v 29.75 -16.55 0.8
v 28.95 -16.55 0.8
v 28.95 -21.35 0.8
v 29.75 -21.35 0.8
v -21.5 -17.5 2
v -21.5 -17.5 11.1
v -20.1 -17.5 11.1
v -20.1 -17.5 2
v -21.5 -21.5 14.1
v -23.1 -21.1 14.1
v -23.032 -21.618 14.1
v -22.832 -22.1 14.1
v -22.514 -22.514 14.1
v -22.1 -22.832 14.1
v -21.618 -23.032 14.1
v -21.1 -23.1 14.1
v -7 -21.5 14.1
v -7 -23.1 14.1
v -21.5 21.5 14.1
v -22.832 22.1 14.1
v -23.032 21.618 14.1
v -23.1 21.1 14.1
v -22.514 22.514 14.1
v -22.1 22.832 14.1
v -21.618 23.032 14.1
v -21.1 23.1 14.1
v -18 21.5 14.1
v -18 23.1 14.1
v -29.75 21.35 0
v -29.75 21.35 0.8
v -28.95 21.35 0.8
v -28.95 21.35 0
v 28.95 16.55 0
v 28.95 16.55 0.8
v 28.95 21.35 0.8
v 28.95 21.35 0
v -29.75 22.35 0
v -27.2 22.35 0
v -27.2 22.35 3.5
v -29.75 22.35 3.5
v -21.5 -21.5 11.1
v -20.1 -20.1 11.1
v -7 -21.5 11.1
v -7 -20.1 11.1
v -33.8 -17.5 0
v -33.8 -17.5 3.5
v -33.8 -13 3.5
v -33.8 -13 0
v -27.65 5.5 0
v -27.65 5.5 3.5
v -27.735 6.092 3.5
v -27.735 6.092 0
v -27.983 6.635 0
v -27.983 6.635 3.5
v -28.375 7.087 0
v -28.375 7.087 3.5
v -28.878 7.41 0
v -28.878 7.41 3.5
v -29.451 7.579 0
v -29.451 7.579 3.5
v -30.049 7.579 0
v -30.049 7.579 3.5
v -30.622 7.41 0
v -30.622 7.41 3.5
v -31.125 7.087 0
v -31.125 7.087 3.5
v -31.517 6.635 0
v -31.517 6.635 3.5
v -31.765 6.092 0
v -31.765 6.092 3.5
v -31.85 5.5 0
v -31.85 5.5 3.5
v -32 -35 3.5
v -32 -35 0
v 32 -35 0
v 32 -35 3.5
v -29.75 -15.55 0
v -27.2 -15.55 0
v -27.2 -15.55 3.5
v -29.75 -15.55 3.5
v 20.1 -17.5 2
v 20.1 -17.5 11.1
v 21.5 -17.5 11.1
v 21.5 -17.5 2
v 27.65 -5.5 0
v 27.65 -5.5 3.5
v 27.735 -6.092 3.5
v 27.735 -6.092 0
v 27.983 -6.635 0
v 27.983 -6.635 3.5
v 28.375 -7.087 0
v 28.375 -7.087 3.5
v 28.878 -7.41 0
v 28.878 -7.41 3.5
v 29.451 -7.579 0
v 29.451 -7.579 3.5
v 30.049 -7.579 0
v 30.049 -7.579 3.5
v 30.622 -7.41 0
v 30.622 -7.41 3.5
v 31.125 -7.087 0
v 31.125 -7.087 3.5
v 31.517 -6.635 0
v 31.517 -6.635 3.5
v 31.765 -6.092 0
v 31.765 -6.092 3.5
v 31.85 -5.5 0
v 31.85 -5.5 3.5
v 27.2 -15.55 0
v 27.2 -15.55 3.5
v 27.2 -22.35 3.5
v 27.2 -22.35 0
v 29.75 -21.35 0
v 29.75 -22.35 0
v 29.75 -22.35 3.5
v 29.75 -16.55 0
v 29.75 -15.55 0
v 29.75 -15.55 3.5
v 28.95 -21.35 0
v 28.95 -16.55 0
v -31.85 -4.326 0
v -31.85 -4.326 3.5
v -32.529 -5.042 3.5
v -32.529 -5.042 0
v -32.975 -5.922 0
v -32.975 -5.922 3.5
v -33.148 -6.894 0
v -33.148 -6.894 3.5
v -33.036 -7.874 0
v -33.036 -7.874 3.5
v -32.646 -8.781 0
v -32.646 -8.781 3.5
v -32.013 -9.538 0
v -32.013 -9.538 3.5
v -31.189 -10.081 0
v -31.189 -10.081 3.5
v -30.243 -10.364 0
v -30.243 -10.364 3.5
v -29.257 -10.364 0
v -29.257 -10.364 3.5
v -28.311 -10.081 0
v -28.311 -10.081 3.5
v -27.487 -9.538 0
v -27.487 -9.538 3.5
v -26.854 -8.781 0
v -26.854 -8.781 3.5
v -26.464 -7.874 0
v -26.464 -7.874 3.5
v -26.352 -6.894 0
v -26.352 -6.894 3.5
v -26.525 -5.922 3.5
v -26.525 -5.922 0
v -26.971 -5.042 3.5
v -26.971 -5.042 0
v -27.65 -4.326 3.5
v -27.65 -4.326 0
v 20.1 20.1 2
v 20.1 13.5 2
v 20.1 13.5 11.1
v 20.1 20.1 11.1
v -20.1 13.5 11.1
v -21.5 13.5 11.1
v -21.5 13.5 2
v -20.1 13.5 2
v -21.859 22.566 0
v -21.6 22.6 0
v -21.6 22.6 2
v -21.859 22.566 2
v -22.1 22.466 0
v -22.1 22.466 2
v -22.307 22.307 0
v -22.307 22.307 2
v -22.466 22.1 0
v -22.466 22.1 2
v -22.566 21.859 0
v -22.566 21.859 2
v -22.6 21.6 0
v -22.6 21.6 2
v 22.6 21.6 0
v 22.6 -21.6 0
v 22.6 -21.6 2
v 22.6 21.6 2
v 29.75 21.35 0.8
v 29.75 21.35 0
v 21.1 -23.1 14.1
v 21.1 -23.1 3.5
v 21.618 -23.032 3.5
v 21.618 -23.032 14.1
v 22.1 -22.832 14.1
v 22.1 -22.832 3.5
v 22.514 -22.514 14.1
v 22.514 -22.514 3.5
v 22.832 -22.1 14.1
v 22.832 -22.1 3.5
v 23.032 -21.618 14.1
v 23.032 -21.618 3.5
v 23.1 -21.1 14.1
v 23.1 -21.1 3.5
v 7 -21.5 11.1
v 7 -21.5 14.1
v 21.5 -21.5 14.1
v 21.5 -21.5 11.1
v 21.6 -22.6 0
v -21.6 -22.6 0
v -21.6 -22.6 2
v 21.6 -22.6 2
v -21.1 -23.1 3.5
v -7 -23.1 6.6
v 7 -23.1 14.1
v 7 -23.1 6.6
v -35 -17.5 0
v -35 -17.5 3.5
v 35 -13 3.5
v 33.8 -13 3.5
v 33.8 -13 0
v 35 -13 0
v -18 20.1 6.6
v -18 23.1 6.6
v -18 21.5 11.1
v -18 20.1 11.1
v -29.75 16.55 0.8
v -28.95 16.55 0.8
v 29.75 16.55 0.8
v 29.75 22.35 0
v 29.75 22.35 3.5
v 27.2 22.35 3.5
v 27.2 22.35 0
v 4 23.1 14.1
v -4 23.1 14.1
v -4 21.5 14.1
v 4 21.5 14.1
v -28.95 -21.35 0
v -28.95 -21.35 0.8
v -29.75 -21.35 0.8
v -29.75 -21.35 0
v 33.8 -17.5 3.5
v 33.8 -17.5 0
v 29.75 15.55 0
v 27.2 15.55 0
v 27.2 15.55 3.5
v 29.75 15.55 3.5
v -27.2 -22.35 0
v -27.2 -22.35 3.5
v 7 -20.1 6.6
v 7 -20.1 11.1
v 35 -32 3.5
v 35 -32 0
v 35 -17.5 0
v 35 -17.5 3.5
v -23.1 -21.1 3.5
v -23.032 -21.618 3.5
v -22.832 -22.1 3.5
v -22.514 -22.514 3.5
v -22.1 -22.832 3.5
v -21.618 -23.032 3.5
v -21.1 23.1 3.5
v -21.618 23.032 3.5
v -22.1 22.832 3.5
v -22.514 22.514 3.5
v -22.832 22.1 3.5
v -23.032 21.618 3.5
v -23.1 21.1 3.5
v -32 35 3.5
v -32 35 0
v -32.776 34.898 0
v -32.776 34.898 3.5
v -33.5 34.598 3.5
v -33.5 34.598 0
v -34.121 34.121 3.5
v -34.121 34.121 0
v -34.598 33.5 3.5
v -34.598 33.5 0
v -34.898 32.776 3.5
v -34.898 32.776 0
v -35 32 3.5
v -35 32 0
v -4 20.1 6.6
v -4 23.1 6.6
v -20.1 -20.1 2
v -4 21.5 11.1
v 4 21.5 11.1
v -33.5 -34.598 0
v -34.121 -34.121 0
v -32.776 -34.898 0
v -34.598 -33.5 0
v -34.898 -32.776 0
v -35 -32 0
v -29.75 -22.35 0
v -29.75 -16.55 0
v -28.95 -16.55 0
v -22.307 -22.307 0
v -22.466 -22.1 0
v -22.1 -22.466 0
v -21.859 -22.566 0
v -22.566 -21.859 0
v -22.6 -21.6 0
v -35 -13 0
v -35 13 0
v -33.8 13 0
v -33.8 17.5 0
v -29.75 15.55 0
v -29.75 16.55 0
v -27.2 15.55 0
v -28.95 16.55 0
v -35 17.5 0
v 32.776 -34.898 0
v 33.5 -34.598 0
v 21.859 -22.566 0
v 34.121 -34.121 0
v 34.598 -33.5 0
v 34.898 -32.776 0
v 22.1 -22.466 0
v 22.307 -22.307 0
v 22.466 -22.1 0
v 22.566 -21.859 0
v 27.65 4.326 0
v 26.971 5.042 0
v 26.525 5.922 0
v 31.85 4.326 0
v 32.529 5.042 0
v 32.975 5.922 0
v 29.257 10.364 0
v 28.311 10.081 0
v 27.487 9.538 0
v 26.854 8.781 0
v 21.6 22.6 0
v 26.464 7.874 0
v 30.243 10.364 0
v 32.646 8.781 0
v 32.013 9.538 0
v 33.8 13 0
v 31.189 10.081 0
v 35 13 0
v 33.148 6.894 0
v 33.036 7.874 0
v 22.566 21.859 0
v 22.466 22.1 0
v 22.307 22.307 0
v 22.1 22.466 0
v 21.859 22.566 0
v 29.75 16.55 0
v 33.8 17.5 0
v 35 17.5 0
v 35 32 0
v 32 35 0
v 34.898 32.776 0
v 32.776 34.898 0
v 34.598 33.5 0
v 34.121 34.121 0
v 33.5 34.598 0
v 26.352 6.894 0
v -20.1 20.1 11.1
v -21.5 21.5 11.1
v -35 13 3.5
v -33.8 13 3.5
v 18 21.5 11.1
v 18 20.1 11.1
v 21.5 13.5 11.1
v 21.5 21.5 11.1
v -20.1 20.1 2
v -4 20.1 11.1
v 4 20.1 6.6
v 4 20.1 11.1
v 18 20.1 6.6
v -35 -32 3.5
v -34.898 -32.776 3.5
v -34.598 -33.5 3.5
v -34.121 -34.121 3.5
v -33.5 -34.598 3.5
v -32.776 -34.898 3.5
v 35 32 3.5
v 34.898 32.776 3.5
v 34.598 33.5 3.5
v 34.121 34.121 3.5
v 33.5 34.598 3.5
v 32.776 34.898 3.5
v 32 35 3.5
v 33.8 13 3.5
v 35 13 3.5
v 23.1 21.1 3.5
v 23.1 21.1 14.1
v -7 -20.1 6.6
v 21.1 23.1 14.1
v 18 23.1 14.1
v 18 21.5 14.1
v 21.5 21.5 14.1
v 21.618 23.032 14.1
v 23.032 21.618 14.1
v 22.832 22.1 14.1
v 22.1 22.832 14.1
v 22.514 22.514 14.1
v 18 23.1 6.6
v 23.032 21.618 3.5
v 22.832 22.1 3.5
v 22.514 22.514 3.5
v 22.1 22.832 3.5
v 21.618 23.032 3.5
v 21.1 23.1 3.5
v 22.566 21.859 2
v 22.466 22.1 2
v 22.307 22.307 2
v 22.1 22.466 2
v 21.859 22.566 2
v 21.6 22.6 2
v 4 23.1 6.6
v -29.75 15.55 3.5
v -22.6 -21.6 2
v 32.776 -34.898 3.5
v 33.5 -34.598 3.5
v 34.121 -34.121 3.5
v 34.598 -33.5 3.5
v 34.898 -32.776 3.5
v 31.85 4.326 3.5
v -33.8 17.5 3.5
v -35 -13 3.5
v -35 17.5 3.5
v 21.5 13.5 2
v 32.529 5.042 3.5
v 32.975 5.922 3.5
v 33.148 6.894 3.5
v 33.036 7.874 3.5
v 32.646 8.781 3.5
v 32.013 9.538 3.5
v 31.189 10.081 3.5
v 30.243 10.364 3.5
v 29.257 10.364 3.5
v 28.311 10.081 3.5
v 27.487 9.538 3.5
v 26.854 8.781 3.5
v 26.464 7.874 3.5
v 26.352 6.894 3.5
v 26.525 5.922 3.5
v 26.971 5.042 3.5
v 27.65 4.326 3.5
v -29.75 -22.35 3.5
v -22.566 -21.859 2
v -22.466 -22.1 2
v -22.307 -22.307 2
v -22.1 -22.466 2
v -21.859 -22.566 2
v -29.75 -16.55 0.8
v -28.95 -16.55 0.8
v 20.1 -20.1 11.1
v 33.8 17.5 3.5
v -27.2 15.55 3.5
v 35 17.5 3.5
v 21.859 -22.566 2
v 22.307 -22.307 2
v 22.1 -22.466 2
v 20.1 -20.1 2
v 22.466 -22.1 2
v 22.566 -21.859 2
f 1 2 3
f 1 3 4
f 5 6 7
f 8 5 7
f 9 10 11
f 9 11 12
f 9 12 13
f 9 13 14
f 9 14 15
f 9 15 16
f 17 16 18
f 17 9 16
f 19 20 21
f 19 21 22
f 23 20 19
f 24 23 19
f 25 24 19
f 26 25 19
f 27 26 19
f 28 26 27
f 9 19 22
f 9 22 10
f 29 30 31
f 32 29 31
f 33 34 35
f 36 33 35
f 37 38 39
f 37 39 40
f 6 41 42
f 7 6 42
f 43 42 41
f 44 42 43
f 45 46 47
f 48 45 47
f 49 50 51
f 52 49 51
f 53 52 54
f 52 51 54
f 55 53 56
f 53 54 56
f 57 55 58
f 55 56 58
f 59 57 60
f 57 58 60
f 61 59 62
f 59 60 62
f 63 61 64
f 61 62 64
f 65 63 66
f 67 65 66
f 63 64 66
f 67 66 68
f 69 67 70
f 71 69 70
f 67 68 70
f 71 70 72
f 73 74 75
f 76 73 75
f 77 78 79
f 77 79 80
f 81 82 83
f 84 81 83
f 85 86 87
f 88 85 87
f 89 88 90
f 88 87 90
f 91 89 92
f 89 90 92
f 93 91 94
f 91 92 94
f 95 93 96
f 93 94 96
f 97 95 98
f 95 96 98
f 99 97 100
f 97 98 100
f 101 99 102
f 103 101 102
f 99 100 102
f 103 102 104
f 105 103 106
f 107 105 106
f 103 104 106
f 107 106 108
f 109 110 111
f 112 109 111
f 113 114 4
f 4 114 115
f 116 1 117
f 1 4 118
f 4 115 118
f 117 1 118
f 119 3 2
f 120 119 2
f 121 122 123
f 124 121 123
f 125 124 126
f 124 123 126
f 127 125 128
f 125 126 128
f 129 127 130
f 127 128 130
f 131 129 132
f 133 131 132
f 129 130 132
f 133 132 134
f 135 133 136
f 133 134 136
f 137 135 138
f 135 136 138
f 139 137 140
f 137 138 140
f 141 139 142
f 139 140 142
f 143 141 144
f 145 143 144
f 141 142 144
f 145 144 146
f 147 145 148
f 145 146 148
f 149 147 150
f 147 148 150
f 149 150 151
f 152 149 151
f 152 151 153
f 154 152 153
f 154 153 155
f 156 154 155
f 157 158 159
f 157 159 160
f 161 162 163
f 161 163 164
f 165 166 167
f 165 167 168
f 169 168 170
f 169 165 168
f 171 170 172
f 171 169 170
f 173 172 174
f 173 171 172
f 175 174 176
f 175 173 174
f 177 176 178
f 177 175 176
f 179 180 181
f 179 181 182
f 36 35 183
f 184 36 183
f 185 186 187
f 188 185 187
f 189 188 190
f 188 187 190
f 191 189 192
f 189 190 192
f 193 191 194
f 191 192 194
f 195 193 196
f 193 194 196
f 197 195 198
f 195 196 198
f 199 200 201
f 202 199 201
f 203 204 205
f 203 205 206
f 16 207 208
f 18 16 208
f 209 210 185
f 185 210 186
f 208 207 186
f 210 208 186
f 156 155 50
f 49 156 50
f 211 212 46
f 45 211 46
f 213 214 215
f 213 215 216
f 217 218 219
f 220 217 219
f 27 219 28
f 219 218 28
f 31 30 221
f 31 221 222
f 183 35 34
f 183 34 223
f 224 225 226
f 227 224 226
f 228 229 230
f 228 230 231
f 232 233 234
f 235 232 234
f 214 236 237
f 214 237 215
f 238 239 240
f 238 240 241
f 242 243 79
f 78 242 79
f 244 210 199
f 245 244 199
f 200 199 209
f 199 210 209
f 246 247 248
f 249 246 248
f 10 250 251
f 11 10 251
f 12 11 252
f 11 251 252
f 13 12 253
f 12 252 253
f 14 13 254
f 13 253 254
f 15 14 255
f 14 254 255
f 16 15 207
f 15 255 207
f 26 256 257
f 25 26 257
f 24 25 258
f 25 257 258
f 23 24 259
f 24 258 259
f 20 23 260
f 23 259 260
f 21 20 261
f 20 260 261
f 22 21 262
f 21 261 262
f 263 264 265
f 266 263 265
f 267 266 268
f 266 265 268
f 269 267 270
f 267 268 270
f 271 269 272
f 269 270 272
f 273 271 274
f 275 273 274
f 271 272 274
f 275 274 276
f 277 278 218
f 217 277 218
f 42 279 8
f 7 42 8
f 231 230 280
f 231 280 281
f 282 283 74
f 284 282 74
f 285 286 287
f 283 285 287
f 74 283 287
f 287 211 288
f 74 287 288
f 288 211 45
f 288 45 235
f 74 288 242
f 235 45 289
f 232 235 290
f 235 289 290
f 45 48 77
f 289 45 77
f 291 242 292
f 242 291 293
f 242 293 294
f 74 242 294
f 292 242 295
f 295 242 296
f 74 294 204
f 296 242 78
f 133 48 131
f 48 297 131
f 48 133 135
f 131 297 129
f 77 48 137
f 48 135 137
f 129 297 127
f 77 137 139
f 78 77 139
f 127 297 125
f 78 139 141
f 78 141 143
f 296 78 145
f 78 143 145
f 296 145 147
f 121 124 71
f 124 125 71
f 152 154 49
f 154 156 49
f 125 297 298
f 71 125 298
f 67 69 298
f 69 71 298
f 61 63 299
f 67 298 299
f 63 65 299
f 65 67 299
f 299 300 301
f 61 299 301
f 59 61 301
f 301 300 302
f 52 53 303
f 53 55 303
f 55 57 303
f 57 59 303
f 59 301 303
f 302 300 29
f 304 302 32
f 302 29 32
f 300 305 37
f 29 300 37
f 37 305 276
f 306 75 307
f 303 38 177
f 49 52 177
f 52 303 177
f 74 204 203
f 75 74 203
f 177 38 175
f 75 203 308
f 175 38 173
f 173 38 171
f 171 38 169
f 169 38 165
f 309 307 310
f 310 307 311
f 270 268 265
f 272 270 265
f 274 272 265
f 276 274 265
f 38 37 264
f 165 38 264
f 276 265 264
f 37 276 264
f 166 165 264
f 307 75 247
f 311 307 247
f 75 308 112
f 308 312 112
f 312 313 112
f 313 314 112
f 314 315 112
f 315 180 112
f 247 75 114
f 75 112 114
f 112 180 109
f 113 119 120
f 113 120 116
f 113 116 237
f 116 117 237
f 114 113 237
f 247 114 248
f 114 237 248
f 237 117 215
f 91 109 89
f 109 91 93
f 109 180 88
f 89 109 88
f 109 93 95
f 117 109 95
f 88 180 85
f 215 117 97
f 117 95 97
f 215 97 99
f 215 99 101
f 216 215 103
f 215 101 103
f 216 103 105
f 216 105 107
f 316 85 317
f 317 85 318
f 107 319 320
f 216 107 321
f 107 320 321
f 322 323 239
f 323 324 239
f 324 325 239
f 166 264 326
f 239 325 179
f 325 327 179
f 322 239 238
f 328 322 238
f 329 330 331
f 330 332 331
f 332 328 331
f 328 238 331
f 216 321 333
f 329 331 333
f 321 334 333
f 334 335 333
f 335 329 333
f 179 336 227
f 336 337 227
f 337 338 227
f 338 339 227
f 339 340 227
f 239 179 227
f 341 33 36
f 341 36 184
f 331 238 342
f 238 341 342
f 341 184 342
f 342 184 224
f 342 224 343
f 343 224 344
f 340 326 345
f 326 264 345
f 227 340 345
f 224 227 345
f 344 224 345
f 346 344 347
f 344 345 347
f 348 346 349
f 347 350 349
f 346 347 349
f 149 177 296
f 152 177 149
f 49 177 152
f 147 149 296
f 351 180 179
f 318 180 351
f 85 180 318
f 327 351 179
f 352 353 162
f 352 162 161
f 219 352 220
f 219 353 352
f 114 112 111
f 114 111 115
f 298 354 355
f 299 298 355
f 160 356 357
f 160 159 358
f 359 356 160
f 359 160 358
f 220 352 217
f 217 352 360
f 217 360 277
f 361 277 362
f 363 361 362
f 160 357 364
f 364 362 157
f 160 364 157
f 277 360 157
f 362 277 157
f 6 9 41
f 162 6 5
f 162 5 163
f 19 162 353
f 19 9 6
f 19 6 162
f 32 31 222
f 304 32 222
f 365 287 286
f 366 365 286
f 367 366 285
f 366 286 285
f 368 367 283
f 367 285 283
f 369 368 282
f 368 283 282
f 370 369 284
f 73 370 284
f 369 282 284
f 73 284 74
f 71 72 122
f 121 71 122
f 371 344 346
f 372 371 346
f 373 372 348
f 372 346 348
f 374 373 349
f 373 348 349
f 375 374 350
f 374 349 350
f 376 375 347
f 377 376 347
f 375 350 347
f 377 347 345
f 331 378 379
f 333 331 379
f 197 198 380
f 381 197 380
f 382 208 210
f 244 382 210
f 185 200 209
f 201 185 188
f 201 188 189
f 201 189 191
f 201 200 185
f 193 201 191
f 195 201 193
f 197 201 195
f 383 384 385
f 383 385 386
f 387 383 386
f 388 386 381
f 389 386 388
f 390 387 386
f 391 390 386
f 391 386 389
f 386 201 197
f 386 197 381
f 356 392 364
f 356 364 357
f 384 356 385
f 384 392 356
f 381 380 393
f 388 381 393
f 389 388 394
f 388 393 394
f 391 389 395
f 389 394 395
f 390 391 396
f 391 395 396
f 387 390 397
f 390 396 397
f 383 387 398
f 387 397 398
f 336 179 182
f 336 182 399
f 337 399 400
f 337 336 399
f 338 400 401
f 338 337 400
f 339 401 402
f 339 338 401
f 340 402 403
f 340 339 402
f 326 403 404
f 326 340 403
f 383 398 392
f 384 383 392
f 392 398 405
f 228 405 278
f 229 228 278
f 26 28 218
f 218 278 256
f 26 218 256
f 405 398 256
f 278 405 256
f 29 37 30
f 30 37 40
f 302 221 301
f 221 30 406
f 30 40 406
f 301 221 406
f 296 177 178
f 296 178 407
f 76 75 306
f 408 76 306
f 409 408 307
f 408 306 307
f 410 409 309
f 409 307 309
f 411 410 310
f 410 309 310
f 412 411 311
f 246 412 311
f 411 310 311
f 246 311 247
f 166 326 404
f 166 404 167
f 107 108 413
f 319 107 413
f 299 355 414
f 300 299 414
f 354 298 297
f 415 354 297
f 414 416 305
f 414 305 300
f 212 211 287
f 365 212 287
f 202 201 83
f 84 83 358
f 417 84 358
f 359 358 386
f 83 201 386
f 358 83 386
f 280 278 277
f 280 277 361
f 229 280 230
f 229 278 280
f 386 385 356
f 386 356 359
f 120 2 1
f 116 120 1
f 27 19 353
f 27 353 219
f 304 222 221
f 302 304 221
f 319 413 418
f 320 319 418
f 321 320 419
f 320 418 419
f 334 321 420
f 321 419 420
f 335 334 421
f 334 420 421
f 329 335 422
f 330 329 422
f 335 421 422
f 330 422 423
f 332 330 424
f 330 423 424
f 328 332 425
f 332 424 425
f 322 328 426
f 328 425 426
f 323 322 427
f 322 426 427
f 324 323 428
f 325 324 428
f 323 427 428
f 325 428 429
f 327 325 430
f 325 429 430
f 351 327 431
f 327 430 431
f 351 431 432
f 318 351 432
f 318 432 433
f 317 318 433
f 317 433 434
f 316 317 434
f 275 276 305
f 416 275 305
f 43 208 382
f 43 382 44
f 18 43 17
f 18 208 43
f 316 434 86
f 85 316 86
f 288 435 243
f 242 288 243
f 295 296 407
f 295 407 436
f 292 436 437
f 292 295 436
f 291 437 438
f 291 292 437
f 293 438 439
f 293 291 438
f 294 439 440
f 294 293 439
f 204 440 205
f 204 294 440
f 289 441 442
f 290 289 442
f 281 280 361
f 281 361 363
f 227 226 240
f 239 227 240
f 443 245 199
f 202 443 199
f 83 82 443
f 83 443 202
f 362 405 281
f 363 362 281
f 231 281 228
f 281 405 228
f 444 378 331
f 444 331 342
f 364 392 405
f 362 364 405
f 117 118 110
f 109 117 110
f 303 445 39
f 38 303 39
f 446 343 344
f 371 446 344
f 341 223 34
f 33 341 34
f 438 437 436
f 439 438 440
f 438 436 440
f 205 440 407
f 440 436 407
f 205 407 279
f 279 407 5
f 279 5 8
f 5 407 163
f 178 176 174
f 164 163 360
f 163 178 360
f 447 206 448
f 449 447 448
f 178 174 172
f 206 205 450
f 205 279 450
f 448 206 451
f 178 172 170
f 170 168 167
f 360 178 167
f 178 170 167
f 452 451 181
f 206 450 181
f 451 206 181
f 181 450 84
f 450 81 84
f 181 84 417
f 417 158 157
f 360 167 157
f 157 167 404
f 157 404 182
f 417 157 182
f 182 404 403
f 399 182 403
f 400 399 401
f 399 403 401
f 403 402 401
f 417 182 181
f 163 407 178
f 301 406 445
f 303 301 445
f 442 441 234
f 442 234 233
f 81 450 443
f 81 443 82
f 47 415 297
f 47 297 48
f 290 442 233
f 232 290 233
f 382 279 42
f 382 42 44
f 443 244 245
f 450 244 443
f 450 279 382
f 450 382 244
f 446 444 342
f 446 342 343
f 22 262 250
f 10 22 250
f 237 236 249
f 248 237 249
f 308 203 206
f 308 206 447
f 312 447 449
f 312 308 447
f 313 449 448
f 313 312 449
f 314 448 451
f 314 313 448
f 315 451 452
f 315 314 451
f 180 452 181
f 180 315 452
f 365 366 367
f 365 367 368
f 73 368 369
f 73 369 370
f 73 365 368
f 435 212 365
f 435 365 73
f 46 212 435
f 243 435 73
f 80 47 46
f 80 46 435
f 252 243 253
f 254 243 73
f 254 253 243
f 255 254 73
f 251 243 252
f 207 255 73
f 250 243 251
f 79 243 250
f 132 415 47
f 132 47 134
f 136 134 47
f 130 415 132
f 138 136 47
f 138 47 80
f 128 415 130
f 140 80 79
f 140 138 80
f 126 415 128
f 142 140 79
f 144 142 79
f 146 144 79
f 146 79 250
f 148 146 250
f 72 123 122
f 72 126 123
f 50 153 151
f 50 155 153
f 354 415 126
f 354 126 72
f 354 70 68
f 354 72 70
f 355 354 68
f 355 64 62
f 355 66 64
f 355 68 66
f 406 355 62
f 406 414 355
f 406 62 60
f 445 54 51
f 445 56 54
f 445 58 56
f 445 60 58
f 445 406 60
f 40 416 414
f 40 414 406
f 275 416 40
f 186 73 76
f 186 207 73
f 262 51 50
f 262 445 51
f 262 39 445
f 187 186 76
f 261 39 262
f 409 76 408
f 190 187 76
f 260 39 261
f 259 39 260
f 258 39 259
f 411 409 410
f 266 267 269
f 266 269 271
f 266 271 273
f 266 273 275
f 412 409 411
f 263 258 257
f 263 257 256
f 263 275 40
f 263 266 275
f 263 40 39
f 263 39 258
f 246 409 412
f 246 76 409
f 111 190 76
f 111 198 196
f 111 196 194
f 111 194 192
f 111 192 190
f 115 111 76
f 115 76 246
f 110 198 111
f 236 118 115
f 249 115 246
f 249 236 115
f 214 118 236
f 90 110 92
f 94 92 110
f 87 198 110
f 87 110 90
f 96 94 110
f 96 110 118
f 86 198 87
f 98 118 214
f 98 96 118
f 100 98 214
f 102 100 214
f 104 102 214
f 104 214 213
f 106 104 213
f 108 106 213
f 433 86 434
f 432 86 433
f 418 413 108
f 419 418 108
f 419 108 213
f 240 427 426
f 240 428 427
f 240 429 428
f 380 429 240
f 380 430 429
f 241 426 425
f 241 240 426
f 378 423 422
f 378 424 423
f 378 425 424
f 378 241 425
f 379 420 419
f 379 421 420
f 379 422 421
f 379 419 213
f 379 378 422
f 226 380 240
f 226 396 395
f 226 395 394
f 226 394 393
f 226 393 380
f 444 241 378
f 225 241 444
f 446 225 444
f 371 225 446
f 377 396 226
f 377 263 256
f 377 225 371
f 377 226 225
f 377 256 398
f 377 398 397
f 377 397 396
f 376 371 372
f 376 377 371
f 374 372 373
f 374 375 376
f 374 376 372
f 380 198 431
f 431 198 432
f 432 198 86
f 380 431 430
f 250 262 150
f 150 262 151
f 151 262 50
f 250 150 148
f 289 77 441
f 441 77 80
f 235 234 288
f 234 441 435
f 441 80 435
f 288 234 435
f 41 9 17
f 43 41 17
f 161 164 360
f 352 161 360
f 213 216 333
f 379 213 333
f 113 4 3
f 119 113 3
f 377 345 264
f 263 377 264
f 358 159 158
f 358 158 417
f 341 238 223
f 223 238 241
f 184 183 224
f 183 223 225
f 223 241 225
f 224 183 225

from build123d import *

# Parameters (mm, degrees)
F0_W      = 40.2
F0_H      = 40.2
F1_DEPTH  = 14.1
F2_DEPTH  = 3.5
F3_W      = 1.2
F3_H      = 4.5
F4_DEPTH  = 25
F6_DEPTH  = 2
F7_W      = 43
F7_H      = 43
F7_W_2    = 40.2
F7_H_2    = 40.2
F8_DEPTH  = 3
F9_W      = 14
F9_H      = 7.5
F10_DEPTH = 5
F11_W     = 14
F11_H     = 7.5
F12_DEPTH = 5
F13_W     = 1.4
F13_H     = 31
F14_DEPTH = 15
F15_W     = 0.8
F15_H     = 4.8
F16_DEPTH = 2.7
F17_DEPTH = 7


with BuildPart() as f1:
    # F0 (on Top) → F1 (new body)
    with BuildSketch(Plane.XY):
        with BuildLine():
            Line((23.1, -21.1), (23.1, 21.1))
            ThreePointArc((23.1, 21.1), (22.514214, 22.514214), (21.1, 23.1))
            Line((21.1, 23.1), (-21.1, 23.1))
            ThreePointArc((-21.1, 23.1), (-22.514214, 22.514214), (-23.1, 21.1))
            Line((-23.1, 21.1), (-23.1, -21.1))
            ThreePointArc((-23.1, -21.1), (-22.514214, -22.514214), (-21.1, -23.1))
            Line((-21.1, -23.1), (21.1, -23.1))
            ThreePointArc((21.1, -23.1), (22.514214, -22.514214), (23.1, -21.1))
        make_face()
        Rectangle(F0_W, F0_H, mode=Mode.SUBTRACT)
    extrude(amount=F1_DEPTH)

    # F0 (on Top) → F2 (join)
    with BuildSketch(Plane.XY):
        with BuildLine():
            Line((32, 35), (-32, 35))
            ThreePointArc((-32, 35), (-34.12132, 34.12132), (-35, 32))
            Line((-35, 32), (-35, -32))
            ThreePointArc((-35, -32), (-34.12132, -34.12132), (-32, -35))
            Line((-32, -35), (32, -35))
            ThreePointArc((32, -35), (34.12132, -34.12132), (35, -32))
            Line((35, -32), (35, 32))
            ThreePointArc((35, 32), (34.12132, 34.12132), (32, 35))
        make_face()
        with BuildLine():
            ThreePointArc((21.1, 23.1), (22.514214, 22.514214), (23.1, 21.1))
            Line((23.1, 21.1), (23.1, -21.1))
            ThreePointArc((23.1, -21.1), (22.514214, -22.514214), (21.1, -23.1))
            Line((21.1, -23.1), (-21.1, -23.1))
            ThreePointArc((-21.1, -23.1), (-22.514214, -22.514214), (-23.1, -21.1))
            Line((-23.1, -21.1), (-23.1, 21.1))
            ThreePointArc((-23.1, 21.1), (-22.514214, 22.514214), (-21.1, 23.1))
            Line((-21.1, 23.1), (21.1, 23.1))
        make_face(mode=Mode.SUBTRACT)
    extrude(amount=F2_DEPTH)

    # F3 (on face) → F4 (cut)
    with BuildSketch(Plane.XY.offset(3.5)):
        with Locations((-34.4, 15.25)):
            Rectangle(F3_W, F3_H)
        with Locations((34.4, -15.25)):
            Rectangle(F3_W, F3_H)
        with BuildLine():
            Line((31.85, -5.5), (31.85, 4.326052))
            ThreePointArc((31.85, 4.326052), (29.75, 10.4), (27.65, 4.326052))
            Line((27.65, 4.326052), (27.65, -5.5))
            ThreePointArc((27.65, -5.5), (29.75, -7.6), (31.85, -5.5))
        make_face()
        with BuildLine():
            ThreePointArc((-27.65, 5.5), (-29.75, 7.6), (-31.85, 5.5))
            Line((-31.85, 5.5), (-31.85, -4.326052))
            ThreePointArc((-31.85, -4.326052), (-29.75, -10.4), (-27.65, -4.326052))
            Line((-27.65, -4.326052), (-27.65, 5.5))
        make_face()
        with Locations((34.4, 15.25)):
            Rectangle(F3_W, F3_H)
        with Locations((-34.4, -15.25)):
            Rectangle(F3_W, F3_H)
    extrude(amount=-F4_DEPTH, mode=Mode.SUBTRACT)

    # F5 (on Top) → F6 (cut)
    with BuildSketch(Plane.XY):
        with BuildLine():
            ThreePointArc((-22.6, -21.6), (-22.307107, -22.307107), (-21.6, -22.6))
            Line((-21.6, -22.6), (21.6, -22.6))
            ThreePointArc((21.6, -22.6), (22.307107, -22.307107), (22.6, -21.6))
            Line((22.6, -21.6), (22.6, 21.6))
            ThreePointArc((22.6, 21.6), (22.307107, 22.307107), (21.6, 22.6))
            Line((21.6, 22.6), (-21.6, 22.6))
            ThreePointArc((-21.6, 22.6), (-22.307107, 22.307107), (-22.6, 21.6))
            Line((-22.6, 21.6), (-22.6, -21.6))
        make_face()
    extrude(amount=F6_DEPTH, mode=Mode.SUBTRACT)

    # F7 (on face) → F8 (cut)
    with BuildSketch(Plane.XY.offset(14.1)):
        Rectangle(F7_W, F7_H)
        Rectangle(F7_W_2, F7_H_2, mode=Mode.SUBTRACT)
    extrude(amount=-F8_DEPTH, mode=Mode.SUBTRACT)

    # F9 (on face) → F10 (cut)
    with BuildSketch(Plane.XZ.offset(23.1)):
        with Locations((0, 10.35)):
            Rectangle(F9_W, F9_H)
    extrude(amount=-F10_DEPTH, mode=Mode.SUBTRACT)

    # F11 (on face) → F12 (cut)
    with BuildSketch(Plane(origin=(0, 23.1, 0), x_dir=(-1, 0, 0), z_dir=(0, 1, 0))):
        with Locations((-11, 10.35)):
            Rectangle(F11_W, F11_H)
        with Locations((11, 10.35)):
            Rectangle(F11_W, F11_H)
    extrude(amount=-F12_DEPTH, mode=Mode.SUBTRACT)

    # F13 (on face) → F14 (cut)
    with BuildSketch(Plane.XY.offset(11.1)):
        with Locations((-20.8, -2)):
            Rectangle(F13_W, F13_H)
        with Locations((20.8, -2)):
            Rectangle(F13_W, F13_H)
    extrude(amount=-F14_DEPTH, mode=Mode.SUBTRACT)

    # F15 (on face) → F16 (cut)
    with BuildSketch(Plane.XY.offset(3.5)):
        Polygon((-27.2, 15.55), (-27.2, 22.35), (-29.75, 22.35), (-29.75, 21.35), (-28.95, 21.35), (-28.95, 16.55), (-29.75, 16.55), (-29.75, 15.55), align=None)
        with Locations((-29.35, 18.95)):
            Rectangle(F15_W, F15_H)
        with Locations((29.35, 18.95)):
            Rectangle(F15_W, F15_H)
        Polygon((29.75, 22.35), (27.2, 22.35), (27.2, 15.55), (29.75, 15.55), (29.75, 16.55), (28.95, 16.55), (28.95, 21.35), (29.75, 21.35), align=None)
        Polygon((27.2, -15.55), (27.2, -22.35), (29.75, -22.35), (29.75, -21.35), (28.95, -21.35), (28.95, -16.55), (29.75, -16.55), (29.75, -15.55), align=None)
        with Locations((29.35, -18.95)):
            Rectangle(F15_W, F15_H)
        Polygon((-27.2, -22.35), (-27.2, -15.55), (-29.75, -15.55), (-29.75, -16.55), (-28.95, -16.55), (-28.95, -21.35), (-29.75, -21.35), (-29.75, -22.35), align=None)
        with Locations((-29.35, -18.95)):
            Rectangle(F15_W, F15_H)
    extrude(amount=-F16_DEPTH, mode=Mode.SUBTRACT)

    # F15 (on face) → F17 (cut)
    with BuildSketch(Plane.XY.offset(3.5)):
        Polygon((-27.2, 15.55), (-27.2, 22.35), (-29.75, 22.35), (-29.75, 21.35), (-28.95, 21.35), (-28.95, 16.55), (-29.75, 16.55), (-29.75, 15.55), align=None)
        Polygon((29.75, 22.35), (27.2, 22.35), (27.2, 15.55), (29.75, 15.55), (29.75, 16.55), (28.95, 16.55), (28.95, 21.35), (29.75, 21.35), align=None)
        Polygon((27.2, -15.55), (27.2, -22.35), (29.75, -22.35), (29.75, -21.35), (28.95, -21.35), (28.95, -16.55), (29.75, -16.55), (29.75, -15.55), align=None)
        Polygon((-27.2, -22.35), (-27.2, -15.55), (-29.75, -15.55), (-29.75, -16.55), (-28.95, -16.55), (-28.95, -21.35), (-29.75, -21.35), (-29.75, -22.35), align=None)
    extrude(amount=-F17_DEPTH, mode=Mode.SUBTRACT)


solid = f1.part
